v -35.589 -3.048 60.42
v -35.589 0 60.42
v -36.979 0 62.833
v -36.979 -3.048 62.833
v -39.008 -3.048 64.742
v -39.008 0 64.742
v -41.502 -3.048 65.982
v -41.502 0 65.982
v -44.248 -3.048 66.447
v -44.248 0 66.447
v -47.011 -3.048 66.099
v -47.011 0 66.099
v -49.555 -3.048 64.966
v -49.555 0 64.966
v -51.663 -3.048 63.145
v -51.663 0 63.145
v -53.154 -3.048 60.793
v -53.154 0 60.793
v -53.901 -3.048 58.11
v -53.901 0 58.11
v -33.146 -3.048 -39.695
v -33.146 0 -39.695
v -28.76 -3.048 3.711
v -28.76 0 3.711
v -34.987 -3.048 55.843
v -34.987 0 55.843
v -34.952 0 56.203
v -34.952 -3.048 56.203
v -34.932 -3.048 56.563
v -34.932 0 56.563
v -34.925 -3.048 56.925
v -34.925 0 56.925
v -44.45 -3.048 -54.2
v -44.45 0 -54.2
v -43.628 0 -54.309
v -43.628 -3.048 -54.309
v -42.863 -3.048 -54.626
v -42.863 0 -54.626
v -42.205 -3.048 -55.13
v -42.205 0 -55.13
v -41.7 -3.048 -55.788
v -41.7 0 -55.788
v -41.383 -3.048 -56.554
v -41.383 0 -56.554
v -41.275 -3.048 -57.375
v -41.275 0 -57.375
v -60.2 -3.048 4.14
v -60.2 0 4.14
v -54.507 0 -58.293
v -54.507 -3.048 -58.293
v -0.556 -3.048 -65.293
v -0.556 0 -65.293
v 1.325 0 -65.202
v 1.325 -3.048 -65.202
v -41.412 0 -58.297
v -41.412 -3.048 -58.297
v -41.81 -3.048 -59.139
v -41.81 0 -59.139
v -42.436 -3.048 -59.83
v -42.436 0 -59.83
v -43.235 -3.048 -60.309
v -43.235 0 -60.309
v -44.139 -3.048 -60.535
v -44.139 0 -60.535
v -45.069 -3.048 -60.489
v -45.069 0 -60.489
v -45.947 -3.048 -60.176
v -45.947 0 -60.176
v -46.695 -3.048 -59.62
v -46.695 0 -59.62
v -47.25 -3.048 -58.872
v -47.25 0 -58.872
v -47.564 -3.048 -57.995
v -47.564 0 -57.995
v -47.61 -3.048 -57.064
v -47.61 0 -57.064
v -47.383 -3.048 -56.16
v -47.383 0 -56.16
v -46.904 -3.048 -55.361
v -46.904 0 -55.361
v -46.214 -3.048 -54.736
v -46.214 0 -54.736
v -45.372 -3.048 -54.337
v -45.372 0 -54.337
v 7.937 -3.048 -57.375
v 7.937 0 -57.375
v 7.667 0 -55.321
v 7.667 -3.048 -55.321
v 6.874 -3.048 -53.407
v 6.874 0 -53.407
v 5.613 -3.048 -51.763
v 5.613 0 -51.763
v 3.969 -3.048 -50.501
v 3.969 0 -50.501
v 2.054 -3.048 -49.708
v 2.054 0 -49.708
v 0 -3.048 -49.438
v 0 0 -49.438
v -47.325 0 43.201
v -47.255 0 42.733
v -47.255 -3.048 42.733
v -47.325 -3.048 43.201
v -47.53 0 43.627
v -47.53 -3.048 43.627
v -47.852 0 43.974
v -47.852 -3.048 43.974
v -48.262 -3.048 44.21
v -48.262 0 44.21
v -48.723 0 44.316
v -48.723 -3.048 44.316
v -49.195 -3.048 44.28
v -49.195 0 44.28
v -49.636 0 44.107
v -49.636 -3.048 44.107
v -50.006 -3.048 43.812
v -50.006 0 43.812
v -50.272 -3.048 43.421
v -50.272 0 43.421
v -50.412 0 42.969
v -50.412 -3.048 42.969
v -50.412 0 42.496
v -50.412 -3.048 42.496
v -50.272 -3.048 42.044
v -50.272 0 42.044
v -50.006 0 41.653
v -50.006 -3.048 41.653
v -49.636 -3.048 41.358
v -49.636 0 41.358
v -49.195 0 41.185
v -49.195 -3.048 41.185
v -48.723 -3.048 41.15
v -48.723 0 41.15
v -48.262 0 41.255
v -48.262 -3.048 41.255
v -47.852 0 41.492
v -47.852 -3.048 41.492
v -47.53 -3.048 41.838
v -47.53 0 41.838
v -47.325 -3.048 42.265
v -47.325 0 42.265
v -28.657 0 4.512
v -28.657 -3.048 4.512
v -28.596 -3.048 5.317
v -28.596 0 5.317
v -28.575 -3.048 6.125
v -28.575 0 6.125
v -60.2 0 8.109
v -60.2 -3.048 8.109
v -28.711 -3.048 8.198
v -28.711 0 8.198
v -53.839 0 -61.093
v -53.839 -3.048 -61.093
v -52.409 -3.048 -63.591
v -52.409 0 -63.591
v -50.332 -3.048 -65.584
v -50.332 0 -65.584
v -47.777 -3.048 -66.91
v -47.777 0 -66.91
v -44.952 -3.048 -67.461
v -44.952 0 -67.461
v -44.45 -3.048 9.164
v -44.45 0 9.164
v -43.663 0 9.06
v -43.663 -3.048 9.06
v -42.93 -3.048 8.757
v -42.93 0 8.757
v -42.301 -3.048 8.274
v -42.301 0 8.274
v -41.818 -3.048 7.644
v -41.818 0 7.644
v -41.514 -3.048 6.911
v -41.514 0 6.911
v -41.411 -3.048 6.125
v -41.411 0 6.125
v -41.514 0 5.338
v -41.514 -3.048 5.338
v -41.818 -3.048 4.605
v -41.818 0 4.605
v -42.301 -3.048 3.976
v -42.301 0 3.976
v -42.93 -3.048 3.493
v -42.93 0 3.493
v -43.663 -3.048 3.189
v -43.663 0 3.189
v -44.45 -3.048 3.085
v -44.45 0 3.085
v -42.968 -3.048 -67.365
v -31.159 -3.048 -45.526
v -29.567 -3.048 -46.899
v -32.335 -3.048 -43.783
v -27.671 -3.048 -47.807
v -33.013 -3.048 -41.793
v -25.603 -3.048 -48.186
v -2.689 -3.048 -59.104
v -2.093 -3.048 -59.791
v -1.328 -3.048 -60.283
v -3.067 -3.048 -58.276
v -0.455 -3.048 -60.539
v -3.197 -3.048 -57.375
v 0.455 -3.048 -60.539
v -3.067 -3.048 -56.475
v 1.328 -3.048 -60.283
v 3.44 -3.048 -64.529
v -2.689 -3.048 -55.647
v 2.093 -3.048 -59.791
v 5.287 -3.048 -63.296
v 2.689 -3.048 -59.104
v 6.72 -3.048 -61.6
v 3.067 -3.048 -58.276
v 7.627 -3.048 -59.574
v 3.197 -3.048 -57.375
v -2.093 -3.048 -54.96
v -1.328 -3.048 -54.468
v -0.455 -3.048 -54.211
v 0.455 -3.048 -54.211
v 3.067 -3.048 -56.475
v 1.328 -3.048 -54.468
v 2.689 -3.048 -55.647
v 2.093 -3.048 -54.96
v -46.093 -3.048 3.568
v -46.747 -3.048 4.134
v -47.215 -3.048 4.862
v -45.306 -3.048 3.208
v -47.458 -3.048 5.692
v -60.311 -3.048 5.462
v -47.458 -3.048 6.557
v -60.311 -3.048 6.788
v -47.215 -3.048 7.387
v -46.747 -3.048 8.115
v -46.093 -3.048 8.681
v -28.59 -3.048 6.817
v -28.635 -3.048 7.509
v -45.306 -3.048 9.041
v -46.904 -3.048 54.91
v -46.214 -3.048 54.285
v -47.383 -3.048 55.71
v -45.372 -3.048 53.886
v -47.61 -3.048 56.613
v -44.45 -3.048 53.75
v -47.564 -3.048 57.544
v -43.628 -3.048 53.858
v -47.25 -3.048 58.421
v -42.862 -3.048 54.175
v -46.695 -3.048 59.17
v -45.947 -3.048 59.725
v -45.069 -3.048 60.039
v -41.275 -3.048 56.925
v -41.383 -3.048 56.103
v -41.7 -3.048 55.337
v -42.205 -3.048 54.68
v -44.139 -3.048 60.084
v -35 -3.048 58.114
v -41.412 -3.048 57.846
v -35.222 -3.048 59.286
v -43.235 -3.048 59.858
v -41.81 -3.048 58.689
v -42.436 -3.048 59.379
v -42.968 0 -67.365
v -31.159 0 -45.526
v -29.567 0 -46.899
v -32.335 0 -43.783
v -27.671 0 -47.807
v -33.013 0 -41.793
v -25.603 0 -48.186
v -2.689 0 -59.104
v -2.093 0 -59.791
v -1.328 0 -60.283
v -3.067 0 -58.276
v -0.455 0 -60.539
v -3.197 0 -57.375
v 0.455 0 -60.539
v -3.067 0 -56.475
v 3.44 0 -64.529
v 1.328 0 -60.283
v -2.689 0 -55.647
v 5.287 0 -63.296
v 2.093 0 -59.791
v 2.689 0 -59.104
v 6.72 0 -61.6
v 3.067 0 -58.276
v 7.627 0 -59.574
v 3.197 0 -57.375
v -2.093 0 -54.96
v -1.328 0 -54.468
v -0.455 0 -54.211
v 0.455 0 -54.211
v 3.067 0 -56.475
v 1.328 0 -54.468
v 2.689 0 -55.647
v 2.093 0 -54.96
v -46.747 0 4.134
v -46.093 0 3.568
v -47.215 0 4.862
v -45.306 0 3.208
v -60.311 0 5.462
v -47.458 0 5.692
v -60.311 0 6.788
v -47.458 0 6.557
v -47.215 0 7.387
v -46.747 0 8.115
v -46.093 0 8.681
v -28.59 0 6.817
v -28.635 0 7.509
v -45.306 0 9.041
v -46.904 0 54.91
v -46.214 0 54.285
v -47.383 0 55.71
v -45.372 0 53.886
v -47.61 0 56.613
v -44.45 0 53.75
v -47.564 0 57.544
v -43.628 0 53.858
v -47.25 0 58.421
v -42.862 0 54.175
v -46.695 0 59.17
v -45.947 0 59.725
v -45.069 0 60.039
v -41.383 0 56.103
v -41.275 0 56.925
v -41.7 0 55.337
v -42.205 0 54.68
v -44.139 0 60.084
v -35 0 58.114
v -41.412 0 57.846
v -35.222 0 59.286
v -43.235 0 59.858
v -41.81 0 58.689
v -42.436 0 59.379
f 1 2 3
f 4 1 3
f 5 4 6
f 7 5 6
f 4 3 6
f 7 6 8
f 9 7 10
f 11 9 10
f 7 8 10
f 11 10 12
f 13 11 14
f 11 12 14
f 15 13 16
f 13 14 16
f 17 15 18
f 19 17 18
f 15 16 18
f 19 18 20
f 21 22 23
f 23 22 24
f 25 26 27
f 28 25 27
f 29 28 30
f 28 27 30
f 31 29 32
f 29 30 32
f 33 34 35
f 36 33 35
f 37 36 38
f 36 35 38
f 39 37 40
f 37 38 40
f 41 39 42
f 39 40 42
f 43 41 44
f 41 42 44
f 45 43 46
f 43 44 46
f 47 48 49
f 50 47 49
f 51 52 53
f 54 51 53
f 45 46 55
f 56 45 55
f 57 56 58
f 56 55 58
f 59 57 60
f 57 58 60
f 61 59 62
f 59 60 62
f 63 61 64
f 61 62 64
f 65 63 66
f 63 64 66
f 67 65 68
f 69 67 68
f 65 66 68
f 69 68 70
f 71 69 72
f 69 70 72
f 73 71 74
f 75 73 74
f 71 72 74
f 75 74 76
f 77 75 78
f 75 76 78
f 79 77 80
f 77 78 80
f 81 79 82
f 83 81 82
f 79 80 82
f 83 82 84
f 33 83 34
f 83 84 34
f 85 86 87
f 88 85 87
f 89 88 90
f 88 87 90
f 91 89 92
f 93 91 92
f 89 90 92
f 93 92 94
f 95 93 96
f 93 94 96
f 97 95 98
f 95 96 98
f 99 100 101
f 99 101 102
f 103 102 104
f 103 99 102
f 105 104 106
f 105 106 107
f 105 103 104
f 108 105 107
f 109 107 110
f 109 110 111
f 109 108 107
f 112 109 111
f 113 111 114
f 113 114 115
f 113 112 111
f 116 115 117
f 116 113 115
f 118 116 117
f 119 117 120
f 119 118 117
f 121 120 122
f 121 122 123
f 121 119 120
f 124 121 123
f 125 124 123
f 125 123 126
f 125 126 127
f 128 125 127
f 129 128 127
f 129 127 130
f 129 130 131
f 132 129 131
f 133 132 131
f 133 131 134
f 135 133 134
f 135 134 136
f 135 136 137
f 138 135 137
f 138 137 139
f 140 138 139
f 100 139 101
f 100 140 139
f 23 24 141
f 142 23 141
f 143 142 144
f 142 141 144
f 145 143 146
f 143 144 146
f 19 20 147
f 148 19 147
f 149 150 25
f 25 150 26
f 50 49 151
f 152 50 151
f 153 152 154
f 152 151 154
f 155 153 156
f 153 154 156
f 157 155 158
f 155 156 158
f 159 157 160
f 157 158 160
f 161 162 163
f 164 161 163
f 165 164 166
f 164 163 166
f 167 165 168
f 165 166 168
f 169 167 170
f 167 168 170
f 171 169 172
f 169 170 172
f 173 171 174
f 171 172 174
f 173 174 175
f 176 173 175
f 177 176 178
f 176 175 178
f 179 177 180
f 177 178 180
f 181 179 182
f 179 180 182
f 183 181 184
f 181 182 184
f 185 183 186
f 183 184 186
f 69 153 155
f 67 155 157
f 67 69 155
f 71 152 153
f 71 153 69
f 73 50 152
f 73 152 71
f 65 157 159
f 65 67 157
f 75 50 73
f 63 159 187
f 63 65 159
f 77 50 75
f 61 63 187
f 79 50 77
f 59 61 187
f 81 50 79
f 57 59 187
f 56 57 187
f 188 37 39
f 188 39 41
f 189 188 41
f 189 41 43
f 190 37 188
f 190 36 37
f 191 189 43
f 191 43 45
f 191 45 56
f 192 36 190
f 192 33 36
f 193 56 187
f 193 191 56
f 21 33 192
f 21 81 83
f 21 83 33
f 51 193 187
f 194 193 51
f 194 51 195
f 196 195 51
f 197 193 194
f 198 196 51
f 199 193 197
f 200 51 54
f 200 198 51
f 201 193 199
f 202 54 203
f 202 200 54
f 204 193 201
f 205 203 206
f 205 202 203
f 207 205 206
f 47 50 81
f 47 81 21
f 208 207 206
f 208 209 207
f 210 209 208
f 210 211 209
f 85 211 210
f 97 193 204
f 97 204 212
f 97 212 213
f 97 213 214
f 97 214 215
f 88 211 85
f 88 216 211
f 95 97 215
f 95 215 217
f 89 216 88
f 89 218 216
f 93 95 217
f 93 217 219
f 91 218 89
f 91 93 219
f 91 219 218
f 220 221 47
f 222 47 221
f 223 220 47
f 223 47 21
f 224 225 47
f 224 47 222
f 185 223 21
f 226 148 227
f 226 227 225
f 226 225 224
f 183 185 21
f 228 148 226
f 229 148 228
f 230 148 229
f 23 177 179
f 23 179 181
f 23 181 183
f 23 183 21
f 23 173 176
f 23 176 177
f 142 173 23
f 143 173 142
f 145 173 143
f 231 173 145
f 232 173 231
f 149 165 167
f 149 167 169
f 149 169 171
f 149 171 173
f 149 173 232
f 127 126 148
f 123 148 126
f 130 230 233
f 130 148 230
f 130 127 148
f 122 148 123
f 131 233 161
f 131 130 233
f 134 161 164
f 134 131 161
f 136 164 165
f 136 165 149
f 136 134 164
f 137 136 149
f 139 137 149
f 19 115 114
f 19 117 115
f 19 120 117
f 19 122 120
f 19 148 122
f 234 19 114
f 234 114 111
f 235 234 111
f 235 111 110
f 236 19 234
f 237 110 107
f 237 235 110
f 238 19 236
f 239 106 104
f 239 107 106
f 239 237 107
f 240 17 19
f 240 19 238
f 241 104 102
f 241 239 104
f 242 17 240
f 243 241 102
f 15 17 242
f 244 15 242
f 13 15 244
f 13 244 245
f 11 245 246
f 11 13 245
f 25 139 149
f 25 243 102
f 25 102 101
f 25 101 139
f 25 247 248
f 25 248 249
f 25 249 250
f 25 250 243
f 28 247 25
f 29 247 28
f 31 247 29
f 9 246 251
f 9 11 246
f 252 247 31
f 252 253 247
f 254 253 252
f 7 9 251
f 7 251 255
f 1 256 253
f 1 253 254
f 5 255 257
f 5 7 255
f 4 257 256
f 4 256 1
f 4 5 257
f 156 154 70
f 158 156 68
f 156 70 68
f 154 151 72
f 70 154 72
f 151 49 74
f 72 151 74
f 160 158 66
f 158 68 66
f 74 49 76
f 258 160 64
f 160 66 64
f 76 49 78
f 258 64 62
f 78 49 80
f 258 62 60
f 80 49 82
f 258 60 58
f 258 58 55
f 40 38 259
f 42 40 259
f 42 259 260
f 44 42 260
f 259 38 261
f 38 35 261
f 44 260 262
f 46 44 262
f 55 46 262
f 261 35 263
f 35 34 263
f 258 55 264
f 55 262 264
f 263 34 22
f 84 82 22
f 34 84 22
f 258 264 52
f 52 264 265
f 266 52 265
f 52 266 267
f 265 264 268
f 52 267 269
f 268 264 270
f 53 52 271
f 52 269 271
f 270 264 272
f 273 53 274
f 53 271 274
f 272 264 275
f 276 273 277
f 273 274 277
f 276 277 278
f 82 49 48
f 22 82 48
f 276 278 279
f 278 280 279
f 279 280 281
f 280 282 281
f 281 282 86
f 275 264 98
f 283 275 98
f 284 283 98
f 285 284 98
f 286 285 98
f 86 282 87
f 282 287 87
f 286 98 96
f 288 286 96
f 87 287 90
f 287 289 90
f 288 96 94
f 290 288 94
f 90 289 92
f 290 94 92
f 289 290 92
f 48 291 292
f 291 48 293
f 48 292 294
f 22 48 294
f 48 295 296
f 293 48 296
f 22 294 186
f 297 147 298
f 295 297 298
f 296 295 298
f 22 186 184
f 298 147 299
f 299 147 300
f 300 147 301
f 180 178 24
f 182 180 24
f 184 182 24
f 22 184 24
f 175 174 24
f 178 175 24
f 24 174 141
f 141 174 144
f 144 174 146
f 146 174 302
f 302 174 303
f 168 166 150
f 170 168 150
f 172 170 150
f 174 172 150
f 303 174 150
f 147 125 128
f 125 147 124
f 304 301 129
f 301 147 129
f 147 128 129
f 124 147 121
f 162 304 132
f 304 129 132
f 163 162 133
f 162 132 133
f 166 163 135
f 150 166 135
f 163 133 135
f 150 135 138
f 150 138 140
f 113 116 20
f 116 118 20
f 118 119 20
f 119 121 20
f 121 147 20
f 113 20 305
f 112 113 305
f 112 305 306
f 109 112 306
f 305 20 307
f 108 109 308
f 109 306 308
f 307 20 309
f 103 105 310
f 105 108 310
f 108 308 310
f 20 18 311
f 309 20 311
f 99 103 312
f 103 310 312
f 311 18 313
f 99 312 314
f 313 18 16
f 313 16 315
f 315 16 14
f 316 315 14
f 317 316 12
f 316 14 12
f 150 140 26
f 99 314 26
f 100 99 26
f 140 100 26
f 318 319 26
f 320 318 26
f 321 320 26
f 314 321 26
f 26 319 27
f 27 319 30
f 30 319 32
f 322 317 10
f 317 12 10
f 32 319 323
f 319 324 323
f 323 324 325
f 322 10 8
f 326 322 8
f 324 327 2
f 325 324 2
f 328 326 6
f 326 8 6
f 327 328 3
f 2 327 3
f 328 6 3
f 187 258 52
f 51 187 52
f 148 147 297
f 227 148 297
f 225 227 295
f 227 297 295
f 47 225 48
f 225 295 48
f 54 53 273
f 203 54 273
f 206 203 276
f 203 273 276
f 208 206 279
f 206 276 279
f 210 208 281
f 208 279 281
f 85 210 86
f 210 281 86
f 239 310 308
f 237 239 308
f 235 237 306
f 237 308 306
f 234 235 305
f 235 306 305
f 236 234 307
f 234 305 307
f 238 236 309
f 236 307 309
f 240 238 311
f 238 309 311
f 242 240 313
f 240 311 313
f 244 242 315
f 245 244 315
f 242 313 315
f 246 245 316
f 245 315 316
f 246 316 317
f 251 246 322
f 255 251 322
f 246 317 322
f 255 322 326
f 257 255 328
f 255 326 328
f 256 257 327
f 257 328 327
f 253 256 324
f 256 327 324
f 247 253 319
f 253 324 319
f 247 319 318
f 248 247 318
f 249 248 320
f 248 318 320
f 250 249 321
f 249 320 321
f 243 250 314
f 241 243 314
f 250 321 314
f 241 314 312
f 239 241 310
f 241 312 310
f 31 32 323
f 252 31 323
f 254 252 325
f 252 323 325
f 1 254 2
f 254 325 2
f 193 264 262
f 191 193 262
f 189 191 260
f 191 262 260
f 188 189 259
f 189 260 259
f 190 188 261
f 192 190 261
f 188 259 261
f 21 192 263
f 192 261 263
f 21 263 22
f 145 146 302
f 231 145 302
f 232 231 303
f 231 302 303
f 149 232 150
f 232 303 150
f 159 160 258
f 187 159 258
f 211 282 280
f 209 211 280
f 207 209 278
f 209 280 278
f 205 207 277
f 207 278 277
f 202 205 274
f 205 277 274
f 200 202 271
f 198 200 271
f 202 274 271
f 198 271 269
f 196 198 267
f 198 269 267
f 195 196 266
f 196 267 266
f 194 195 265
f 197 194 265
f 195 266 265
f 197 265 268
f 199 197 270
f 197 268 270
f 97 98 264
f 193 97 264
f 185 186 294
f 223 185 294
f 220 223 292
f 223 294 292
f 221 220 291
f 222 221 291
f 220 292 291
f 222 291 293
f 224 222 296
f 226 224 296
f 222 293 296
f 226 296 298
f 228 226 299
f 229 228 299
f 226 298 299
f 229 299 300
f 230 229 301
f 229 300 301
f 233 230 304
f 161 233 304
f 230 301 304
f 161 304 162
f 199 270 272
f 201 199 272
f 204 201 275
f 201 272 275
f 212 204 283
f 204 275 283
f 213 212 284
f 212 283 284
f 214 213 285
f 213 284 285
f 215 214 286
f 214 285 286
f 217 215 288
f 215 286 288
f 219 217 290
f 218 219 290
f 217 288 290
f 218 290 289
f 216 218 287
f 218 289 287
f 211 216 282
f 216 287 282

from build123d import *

# Parameters (mm, degrees)
F0_R     = 1.5875
F1_DEPTH = 3.048


# Not quite as in the source:
# - a feature names something its author has since deleted; it is built from what else it names


with BuildPart() as f1:
    # F0 (on Front) → F1 (new body)
    with BuildSketch(Plane.XZ):
        with BuildLine():
            Line((-35.5894761368, 60.4198244451), (-34.9866182967, 55.8428987828))
            ThreePointArc((-34.9866182967, 55.8428987828), (-34.9404170511, 56.3828619929), (-34.925, 56.9245788358))
            ThreePointArc((-34.925, 56.9245788358), (-35.092593447, 58.7035019936), (-35.5894761368, 60.4198244451))
        make_face()
        with BuildLine():
            Line((-60.2004882138, 4.1402033601), (-60.2004882138, 8.1089543114))
            ThreePointArc((-60.2004882138, 8.1089543114), (-60.325, 6.1245788358), (-60.2004882138, 4.1402033601))
        make_face()
        with BuildLine():
            ThreePointArc((-34.9866182967, 55.8428987828), (-38.1087610636, 49.8172365933), (-44.45, 47.3995788358))
            Line((-44.45, 47.3995788358), (-44.45, 21.9995788358))
            ThreePointArc((-44.45, 21.9995788358), (-33.9832619763, 18.0603662058), (-28.7109436839, 8.1976758617))
            Line((-28.7109436839, 8.1976758617), (-34.9866182967, 55.8428987828))
        make_face()
        with BuildLine():
            ThreePointArc((-44.45, -9.7504211642), (-54.950325336, -5.7816713228), (-60.2004882138, 4.1402033601))
            Line((-60.2004882138, 4.1402033601), (-54.5067664898, -58.2925744899))
            ThreePointArc((-54.5067664898, -58.2925744899), (-51.9079352447, -50.5666823428), (-44.45, -47.276920164))
            Line((-44.45, -47.276920164), (-44.45, -9.7504211642))
        make_face()
        with BuildLine():
            ThreePointArc((-34.3514989997, -57.3754211642), (-37.3092814629, -50.2347026271), (-44.45, -47.276920164))
            Line((-44.45, -47.276920164), (-44.45, -54.2004211642))
            ThreePointArc((-44.45, -54.2004211642), (-42.2049359697, -55.130357134), (-41.275, -57.3754211642))
            Line((-41.275, -57.3754211642), (-34.3514989997, -57.3754211642))
        make_face()
        with BuildLine():
            Line((-44.45, 21.9995788358), (-44.45, 47.3995788358))
            ThreePointArc((-44.45, 47.3995788358), (-51.5919689055, 50.6223645302), (-53.9009645367, 58.1098612184))
            Line((-53.9009645367, 58.1098612184), (-60.2004882138, 8.1089543114))
            ThreePointArc((-60.2004882138, 8.1089543114), (-54.950325336, 18.0308289943), (-44.45, 21.9995788358))
        make_face()
        with Locations((-48.8420496888, 42.732682374)):
            Circle(F0_R, mode=Mode.SUBTRACT)
        with BuildLine():
            ThreePointArc((-28.7109436839, 8.1976758617), (-33.9832619763, 18.0603662058), (-44.45, 21.9995788358))
            Line((-44.45, 21.9995788358), (-44.45, 9.1638046543))
            ThreePointArc((-44.45, 9.1638046543), (-42.3009428141, 8.2736360216), (-41.4107741814, 6.1245788358))
            ThreePointArc((-41.4107741814, 6.1245788358), (-42.3009428141, 3.9755216499), (-44.45, 3.0853530172))
            Line((-44.45, 3.0853530172), (-44.45, -9.7504211642))
            ThreePointArc((-44.45, -9.7504211642), (-34.1131196636, -5.9238455389), (-28.7595280627, 3.7111341226))
            ThreePointArc((-28.7595280627, 3.7111341226), (-28.6211992399, 4.91433444), (-28.575, 6.1245788358))
            ThreePointArc((-28.575, 6.1245788358), (-28.6090223784, 7.1633535905), (-28.7109436839, 8.1976758617))
        make_face()
        with BuildLine():
            ThreePointArc((-53.9009645367, 58.1098612184), (-51.5919689055, 50.6223645302), (-44.45, 47.3995788358))
            ThreePointArc((-44.45, 47.3995788358), (-38.1087610636, 49.8172365933), (-34.9866182967, 55.8428987828))
            Line((-34.9866182967, 55.8428987828), (-35.5894761368, 60.4198244451))
            ThreePointArc((-35.5894761368, 60.4198244451), (-45.6421147488, 66.37468399), (-53.9009645367, 58.1098612184))
        make_face()
        with BuildLine():
            ThreePointArc((-41.275, 56.9245788358), (-42.2049359697, 54.6795148055), (-44.45, 53.7495788358))
            ThreePointArc((-44.45, 53.7495788358), (-46.6950640303, 59.169642866), (-41.275, 56.9245788358))
        make_face(mode=Mode.SUBTRACT)
        with BuildLine():
            Line((-44.45, 9.1638046543), (-44.45, 21.9995788358))
            ThreePointArc((-44.45, 21.9995788358), (-54.950325336, 18.0308289943), (-60.2004882138, 8.1089543114))
            Line((-60.2004882138, 8.1089543114), (-60.2004882138, 4.1402033601))
            ThreePointArc((-60.2004882138, 4.1402033601), (-54.950325336, -5.7816713228), (-44.45, -9.7504211642))
            Line((-44.45, -9.7504211642), (-44.45, 3.0853530172))
            ThreePointArc((-44.45, 3.0853530172), (-47.4892258186, 6.1245788358), (-44.45, 9.1638046543))
        make_face()
        with BuildLine():
            Line((-7.9375, -57.3754211642), (-34.3514989997, -57.3754211642))
            ThreePointArc((-34.3514989997, -57.3754211642), (-36.803283354, -63.9714386739), (-42.9681138788, -67.3646021105))
            Line((-42.9681138788, -67.3646021105), (-0.5559922874, -65.2934246264))
            ThreePointArc((-0.5559922874, -65.2934246264), (-5.8059062614, -62.7879398695), (-7.9375, -57.3754211642))
        make_face()
        with BuildLine():
            ThreePointArc((-28.7595280627, 3.7111341226), (-34.1131196636, -5.9238455389), (-44.45, -9.7504211642))
            Line((-44.45, -9.7504211642), (-44.45, -47.276920164))
            ThreePointArc((-44.45, -47.276920164), (-37.3092814629, -50.2347026271), (-34.3514989997, -57.3754211642))
            Line((-34.3514989997, -57.3754211642), (-7.9375, -57.3754211642))
            ThreePointArc((-7.9375, -57.3754211642), (-5.6126600757, -51.7627610886), (0, -49.4379211642))
            Line((0, -49.4379211642), (-25.6033683849, -48.186229462))
            ThreePointArc((-25.6033683849, -48.186229462), (-31.1587660622, -45.5255963138), (-33.1463097303, -39.6954091582))
            Line((-33.1463097303, -39.6954091582), (-28.7595280627, 3.7111341226))
        make_face()
        with BuildLine():
            ThreePointArc((-44.45, -47.276920164), (-51.9079352447, -50.5666823428), (-54.5067664898, -58.2925744899))
            ThreePointArc((-54.5067664898, -58.2925744899), (-51.4418867888, -64.6619320978), (-44.9515214608, -67.4614609558))
            Line((-44.9515214608, -67.4614609558), (-42.9681138788, -67.3646021105))
            ThreePointArc((-42.9681138788, -67.3646021105), (-36.803283354, -63.9714386739), (-34.3514989997, -57.3754211642))
            Line((-34.3514989997, -57.3754211642), (-41.275, -57.3754211642))
            ThreePointArc((-41.275, -57.3754211642), (-46.6950640303, -59.6204851945), (-44.45, -54.2004211642))
            Line((-44.45, -54.2004211642), (-44.45, -47.276920164))
        make_face()
        with BuildLine():
            ThreePointArc((0, -49.4379211642), (-5.6126600757, -51.7627610886), (-7.9375, -57.3754211642))
            ThreePointArc((-7.9375, -57.3754211642), (-5.8059062614, -62.7879398695), (-0.5559922874, -65.2934246264))
            Line((-0.5559922874, -65.2934246264), (1.3248513243, -65.2015744479))
            ThreePointArc((1.3248513243, -65.2015744479), (6.0629989954, -62.4983060382), (7.9375, -57.3754211642))
            ThreePointArc((7.9375, -57.3754211642), (5.6126600757, -51.7627610886), (0, -49.4379211642))
        make_face()
        with BuildLine():
            ThreePointArc((3.1965151992, -57.3754211642), (0, -60.5719363635), (-3.1965151992, -57.3754211642))
            ThreePointArc((-3.1965151992, -57.3754211642), (0, -54.178905965), (3.1965151992, -57.3754211642))
        make_face(mode=Mode.SUBTRACT)
    extrude(amount=F1_DEPTH)


solid = f1.part
